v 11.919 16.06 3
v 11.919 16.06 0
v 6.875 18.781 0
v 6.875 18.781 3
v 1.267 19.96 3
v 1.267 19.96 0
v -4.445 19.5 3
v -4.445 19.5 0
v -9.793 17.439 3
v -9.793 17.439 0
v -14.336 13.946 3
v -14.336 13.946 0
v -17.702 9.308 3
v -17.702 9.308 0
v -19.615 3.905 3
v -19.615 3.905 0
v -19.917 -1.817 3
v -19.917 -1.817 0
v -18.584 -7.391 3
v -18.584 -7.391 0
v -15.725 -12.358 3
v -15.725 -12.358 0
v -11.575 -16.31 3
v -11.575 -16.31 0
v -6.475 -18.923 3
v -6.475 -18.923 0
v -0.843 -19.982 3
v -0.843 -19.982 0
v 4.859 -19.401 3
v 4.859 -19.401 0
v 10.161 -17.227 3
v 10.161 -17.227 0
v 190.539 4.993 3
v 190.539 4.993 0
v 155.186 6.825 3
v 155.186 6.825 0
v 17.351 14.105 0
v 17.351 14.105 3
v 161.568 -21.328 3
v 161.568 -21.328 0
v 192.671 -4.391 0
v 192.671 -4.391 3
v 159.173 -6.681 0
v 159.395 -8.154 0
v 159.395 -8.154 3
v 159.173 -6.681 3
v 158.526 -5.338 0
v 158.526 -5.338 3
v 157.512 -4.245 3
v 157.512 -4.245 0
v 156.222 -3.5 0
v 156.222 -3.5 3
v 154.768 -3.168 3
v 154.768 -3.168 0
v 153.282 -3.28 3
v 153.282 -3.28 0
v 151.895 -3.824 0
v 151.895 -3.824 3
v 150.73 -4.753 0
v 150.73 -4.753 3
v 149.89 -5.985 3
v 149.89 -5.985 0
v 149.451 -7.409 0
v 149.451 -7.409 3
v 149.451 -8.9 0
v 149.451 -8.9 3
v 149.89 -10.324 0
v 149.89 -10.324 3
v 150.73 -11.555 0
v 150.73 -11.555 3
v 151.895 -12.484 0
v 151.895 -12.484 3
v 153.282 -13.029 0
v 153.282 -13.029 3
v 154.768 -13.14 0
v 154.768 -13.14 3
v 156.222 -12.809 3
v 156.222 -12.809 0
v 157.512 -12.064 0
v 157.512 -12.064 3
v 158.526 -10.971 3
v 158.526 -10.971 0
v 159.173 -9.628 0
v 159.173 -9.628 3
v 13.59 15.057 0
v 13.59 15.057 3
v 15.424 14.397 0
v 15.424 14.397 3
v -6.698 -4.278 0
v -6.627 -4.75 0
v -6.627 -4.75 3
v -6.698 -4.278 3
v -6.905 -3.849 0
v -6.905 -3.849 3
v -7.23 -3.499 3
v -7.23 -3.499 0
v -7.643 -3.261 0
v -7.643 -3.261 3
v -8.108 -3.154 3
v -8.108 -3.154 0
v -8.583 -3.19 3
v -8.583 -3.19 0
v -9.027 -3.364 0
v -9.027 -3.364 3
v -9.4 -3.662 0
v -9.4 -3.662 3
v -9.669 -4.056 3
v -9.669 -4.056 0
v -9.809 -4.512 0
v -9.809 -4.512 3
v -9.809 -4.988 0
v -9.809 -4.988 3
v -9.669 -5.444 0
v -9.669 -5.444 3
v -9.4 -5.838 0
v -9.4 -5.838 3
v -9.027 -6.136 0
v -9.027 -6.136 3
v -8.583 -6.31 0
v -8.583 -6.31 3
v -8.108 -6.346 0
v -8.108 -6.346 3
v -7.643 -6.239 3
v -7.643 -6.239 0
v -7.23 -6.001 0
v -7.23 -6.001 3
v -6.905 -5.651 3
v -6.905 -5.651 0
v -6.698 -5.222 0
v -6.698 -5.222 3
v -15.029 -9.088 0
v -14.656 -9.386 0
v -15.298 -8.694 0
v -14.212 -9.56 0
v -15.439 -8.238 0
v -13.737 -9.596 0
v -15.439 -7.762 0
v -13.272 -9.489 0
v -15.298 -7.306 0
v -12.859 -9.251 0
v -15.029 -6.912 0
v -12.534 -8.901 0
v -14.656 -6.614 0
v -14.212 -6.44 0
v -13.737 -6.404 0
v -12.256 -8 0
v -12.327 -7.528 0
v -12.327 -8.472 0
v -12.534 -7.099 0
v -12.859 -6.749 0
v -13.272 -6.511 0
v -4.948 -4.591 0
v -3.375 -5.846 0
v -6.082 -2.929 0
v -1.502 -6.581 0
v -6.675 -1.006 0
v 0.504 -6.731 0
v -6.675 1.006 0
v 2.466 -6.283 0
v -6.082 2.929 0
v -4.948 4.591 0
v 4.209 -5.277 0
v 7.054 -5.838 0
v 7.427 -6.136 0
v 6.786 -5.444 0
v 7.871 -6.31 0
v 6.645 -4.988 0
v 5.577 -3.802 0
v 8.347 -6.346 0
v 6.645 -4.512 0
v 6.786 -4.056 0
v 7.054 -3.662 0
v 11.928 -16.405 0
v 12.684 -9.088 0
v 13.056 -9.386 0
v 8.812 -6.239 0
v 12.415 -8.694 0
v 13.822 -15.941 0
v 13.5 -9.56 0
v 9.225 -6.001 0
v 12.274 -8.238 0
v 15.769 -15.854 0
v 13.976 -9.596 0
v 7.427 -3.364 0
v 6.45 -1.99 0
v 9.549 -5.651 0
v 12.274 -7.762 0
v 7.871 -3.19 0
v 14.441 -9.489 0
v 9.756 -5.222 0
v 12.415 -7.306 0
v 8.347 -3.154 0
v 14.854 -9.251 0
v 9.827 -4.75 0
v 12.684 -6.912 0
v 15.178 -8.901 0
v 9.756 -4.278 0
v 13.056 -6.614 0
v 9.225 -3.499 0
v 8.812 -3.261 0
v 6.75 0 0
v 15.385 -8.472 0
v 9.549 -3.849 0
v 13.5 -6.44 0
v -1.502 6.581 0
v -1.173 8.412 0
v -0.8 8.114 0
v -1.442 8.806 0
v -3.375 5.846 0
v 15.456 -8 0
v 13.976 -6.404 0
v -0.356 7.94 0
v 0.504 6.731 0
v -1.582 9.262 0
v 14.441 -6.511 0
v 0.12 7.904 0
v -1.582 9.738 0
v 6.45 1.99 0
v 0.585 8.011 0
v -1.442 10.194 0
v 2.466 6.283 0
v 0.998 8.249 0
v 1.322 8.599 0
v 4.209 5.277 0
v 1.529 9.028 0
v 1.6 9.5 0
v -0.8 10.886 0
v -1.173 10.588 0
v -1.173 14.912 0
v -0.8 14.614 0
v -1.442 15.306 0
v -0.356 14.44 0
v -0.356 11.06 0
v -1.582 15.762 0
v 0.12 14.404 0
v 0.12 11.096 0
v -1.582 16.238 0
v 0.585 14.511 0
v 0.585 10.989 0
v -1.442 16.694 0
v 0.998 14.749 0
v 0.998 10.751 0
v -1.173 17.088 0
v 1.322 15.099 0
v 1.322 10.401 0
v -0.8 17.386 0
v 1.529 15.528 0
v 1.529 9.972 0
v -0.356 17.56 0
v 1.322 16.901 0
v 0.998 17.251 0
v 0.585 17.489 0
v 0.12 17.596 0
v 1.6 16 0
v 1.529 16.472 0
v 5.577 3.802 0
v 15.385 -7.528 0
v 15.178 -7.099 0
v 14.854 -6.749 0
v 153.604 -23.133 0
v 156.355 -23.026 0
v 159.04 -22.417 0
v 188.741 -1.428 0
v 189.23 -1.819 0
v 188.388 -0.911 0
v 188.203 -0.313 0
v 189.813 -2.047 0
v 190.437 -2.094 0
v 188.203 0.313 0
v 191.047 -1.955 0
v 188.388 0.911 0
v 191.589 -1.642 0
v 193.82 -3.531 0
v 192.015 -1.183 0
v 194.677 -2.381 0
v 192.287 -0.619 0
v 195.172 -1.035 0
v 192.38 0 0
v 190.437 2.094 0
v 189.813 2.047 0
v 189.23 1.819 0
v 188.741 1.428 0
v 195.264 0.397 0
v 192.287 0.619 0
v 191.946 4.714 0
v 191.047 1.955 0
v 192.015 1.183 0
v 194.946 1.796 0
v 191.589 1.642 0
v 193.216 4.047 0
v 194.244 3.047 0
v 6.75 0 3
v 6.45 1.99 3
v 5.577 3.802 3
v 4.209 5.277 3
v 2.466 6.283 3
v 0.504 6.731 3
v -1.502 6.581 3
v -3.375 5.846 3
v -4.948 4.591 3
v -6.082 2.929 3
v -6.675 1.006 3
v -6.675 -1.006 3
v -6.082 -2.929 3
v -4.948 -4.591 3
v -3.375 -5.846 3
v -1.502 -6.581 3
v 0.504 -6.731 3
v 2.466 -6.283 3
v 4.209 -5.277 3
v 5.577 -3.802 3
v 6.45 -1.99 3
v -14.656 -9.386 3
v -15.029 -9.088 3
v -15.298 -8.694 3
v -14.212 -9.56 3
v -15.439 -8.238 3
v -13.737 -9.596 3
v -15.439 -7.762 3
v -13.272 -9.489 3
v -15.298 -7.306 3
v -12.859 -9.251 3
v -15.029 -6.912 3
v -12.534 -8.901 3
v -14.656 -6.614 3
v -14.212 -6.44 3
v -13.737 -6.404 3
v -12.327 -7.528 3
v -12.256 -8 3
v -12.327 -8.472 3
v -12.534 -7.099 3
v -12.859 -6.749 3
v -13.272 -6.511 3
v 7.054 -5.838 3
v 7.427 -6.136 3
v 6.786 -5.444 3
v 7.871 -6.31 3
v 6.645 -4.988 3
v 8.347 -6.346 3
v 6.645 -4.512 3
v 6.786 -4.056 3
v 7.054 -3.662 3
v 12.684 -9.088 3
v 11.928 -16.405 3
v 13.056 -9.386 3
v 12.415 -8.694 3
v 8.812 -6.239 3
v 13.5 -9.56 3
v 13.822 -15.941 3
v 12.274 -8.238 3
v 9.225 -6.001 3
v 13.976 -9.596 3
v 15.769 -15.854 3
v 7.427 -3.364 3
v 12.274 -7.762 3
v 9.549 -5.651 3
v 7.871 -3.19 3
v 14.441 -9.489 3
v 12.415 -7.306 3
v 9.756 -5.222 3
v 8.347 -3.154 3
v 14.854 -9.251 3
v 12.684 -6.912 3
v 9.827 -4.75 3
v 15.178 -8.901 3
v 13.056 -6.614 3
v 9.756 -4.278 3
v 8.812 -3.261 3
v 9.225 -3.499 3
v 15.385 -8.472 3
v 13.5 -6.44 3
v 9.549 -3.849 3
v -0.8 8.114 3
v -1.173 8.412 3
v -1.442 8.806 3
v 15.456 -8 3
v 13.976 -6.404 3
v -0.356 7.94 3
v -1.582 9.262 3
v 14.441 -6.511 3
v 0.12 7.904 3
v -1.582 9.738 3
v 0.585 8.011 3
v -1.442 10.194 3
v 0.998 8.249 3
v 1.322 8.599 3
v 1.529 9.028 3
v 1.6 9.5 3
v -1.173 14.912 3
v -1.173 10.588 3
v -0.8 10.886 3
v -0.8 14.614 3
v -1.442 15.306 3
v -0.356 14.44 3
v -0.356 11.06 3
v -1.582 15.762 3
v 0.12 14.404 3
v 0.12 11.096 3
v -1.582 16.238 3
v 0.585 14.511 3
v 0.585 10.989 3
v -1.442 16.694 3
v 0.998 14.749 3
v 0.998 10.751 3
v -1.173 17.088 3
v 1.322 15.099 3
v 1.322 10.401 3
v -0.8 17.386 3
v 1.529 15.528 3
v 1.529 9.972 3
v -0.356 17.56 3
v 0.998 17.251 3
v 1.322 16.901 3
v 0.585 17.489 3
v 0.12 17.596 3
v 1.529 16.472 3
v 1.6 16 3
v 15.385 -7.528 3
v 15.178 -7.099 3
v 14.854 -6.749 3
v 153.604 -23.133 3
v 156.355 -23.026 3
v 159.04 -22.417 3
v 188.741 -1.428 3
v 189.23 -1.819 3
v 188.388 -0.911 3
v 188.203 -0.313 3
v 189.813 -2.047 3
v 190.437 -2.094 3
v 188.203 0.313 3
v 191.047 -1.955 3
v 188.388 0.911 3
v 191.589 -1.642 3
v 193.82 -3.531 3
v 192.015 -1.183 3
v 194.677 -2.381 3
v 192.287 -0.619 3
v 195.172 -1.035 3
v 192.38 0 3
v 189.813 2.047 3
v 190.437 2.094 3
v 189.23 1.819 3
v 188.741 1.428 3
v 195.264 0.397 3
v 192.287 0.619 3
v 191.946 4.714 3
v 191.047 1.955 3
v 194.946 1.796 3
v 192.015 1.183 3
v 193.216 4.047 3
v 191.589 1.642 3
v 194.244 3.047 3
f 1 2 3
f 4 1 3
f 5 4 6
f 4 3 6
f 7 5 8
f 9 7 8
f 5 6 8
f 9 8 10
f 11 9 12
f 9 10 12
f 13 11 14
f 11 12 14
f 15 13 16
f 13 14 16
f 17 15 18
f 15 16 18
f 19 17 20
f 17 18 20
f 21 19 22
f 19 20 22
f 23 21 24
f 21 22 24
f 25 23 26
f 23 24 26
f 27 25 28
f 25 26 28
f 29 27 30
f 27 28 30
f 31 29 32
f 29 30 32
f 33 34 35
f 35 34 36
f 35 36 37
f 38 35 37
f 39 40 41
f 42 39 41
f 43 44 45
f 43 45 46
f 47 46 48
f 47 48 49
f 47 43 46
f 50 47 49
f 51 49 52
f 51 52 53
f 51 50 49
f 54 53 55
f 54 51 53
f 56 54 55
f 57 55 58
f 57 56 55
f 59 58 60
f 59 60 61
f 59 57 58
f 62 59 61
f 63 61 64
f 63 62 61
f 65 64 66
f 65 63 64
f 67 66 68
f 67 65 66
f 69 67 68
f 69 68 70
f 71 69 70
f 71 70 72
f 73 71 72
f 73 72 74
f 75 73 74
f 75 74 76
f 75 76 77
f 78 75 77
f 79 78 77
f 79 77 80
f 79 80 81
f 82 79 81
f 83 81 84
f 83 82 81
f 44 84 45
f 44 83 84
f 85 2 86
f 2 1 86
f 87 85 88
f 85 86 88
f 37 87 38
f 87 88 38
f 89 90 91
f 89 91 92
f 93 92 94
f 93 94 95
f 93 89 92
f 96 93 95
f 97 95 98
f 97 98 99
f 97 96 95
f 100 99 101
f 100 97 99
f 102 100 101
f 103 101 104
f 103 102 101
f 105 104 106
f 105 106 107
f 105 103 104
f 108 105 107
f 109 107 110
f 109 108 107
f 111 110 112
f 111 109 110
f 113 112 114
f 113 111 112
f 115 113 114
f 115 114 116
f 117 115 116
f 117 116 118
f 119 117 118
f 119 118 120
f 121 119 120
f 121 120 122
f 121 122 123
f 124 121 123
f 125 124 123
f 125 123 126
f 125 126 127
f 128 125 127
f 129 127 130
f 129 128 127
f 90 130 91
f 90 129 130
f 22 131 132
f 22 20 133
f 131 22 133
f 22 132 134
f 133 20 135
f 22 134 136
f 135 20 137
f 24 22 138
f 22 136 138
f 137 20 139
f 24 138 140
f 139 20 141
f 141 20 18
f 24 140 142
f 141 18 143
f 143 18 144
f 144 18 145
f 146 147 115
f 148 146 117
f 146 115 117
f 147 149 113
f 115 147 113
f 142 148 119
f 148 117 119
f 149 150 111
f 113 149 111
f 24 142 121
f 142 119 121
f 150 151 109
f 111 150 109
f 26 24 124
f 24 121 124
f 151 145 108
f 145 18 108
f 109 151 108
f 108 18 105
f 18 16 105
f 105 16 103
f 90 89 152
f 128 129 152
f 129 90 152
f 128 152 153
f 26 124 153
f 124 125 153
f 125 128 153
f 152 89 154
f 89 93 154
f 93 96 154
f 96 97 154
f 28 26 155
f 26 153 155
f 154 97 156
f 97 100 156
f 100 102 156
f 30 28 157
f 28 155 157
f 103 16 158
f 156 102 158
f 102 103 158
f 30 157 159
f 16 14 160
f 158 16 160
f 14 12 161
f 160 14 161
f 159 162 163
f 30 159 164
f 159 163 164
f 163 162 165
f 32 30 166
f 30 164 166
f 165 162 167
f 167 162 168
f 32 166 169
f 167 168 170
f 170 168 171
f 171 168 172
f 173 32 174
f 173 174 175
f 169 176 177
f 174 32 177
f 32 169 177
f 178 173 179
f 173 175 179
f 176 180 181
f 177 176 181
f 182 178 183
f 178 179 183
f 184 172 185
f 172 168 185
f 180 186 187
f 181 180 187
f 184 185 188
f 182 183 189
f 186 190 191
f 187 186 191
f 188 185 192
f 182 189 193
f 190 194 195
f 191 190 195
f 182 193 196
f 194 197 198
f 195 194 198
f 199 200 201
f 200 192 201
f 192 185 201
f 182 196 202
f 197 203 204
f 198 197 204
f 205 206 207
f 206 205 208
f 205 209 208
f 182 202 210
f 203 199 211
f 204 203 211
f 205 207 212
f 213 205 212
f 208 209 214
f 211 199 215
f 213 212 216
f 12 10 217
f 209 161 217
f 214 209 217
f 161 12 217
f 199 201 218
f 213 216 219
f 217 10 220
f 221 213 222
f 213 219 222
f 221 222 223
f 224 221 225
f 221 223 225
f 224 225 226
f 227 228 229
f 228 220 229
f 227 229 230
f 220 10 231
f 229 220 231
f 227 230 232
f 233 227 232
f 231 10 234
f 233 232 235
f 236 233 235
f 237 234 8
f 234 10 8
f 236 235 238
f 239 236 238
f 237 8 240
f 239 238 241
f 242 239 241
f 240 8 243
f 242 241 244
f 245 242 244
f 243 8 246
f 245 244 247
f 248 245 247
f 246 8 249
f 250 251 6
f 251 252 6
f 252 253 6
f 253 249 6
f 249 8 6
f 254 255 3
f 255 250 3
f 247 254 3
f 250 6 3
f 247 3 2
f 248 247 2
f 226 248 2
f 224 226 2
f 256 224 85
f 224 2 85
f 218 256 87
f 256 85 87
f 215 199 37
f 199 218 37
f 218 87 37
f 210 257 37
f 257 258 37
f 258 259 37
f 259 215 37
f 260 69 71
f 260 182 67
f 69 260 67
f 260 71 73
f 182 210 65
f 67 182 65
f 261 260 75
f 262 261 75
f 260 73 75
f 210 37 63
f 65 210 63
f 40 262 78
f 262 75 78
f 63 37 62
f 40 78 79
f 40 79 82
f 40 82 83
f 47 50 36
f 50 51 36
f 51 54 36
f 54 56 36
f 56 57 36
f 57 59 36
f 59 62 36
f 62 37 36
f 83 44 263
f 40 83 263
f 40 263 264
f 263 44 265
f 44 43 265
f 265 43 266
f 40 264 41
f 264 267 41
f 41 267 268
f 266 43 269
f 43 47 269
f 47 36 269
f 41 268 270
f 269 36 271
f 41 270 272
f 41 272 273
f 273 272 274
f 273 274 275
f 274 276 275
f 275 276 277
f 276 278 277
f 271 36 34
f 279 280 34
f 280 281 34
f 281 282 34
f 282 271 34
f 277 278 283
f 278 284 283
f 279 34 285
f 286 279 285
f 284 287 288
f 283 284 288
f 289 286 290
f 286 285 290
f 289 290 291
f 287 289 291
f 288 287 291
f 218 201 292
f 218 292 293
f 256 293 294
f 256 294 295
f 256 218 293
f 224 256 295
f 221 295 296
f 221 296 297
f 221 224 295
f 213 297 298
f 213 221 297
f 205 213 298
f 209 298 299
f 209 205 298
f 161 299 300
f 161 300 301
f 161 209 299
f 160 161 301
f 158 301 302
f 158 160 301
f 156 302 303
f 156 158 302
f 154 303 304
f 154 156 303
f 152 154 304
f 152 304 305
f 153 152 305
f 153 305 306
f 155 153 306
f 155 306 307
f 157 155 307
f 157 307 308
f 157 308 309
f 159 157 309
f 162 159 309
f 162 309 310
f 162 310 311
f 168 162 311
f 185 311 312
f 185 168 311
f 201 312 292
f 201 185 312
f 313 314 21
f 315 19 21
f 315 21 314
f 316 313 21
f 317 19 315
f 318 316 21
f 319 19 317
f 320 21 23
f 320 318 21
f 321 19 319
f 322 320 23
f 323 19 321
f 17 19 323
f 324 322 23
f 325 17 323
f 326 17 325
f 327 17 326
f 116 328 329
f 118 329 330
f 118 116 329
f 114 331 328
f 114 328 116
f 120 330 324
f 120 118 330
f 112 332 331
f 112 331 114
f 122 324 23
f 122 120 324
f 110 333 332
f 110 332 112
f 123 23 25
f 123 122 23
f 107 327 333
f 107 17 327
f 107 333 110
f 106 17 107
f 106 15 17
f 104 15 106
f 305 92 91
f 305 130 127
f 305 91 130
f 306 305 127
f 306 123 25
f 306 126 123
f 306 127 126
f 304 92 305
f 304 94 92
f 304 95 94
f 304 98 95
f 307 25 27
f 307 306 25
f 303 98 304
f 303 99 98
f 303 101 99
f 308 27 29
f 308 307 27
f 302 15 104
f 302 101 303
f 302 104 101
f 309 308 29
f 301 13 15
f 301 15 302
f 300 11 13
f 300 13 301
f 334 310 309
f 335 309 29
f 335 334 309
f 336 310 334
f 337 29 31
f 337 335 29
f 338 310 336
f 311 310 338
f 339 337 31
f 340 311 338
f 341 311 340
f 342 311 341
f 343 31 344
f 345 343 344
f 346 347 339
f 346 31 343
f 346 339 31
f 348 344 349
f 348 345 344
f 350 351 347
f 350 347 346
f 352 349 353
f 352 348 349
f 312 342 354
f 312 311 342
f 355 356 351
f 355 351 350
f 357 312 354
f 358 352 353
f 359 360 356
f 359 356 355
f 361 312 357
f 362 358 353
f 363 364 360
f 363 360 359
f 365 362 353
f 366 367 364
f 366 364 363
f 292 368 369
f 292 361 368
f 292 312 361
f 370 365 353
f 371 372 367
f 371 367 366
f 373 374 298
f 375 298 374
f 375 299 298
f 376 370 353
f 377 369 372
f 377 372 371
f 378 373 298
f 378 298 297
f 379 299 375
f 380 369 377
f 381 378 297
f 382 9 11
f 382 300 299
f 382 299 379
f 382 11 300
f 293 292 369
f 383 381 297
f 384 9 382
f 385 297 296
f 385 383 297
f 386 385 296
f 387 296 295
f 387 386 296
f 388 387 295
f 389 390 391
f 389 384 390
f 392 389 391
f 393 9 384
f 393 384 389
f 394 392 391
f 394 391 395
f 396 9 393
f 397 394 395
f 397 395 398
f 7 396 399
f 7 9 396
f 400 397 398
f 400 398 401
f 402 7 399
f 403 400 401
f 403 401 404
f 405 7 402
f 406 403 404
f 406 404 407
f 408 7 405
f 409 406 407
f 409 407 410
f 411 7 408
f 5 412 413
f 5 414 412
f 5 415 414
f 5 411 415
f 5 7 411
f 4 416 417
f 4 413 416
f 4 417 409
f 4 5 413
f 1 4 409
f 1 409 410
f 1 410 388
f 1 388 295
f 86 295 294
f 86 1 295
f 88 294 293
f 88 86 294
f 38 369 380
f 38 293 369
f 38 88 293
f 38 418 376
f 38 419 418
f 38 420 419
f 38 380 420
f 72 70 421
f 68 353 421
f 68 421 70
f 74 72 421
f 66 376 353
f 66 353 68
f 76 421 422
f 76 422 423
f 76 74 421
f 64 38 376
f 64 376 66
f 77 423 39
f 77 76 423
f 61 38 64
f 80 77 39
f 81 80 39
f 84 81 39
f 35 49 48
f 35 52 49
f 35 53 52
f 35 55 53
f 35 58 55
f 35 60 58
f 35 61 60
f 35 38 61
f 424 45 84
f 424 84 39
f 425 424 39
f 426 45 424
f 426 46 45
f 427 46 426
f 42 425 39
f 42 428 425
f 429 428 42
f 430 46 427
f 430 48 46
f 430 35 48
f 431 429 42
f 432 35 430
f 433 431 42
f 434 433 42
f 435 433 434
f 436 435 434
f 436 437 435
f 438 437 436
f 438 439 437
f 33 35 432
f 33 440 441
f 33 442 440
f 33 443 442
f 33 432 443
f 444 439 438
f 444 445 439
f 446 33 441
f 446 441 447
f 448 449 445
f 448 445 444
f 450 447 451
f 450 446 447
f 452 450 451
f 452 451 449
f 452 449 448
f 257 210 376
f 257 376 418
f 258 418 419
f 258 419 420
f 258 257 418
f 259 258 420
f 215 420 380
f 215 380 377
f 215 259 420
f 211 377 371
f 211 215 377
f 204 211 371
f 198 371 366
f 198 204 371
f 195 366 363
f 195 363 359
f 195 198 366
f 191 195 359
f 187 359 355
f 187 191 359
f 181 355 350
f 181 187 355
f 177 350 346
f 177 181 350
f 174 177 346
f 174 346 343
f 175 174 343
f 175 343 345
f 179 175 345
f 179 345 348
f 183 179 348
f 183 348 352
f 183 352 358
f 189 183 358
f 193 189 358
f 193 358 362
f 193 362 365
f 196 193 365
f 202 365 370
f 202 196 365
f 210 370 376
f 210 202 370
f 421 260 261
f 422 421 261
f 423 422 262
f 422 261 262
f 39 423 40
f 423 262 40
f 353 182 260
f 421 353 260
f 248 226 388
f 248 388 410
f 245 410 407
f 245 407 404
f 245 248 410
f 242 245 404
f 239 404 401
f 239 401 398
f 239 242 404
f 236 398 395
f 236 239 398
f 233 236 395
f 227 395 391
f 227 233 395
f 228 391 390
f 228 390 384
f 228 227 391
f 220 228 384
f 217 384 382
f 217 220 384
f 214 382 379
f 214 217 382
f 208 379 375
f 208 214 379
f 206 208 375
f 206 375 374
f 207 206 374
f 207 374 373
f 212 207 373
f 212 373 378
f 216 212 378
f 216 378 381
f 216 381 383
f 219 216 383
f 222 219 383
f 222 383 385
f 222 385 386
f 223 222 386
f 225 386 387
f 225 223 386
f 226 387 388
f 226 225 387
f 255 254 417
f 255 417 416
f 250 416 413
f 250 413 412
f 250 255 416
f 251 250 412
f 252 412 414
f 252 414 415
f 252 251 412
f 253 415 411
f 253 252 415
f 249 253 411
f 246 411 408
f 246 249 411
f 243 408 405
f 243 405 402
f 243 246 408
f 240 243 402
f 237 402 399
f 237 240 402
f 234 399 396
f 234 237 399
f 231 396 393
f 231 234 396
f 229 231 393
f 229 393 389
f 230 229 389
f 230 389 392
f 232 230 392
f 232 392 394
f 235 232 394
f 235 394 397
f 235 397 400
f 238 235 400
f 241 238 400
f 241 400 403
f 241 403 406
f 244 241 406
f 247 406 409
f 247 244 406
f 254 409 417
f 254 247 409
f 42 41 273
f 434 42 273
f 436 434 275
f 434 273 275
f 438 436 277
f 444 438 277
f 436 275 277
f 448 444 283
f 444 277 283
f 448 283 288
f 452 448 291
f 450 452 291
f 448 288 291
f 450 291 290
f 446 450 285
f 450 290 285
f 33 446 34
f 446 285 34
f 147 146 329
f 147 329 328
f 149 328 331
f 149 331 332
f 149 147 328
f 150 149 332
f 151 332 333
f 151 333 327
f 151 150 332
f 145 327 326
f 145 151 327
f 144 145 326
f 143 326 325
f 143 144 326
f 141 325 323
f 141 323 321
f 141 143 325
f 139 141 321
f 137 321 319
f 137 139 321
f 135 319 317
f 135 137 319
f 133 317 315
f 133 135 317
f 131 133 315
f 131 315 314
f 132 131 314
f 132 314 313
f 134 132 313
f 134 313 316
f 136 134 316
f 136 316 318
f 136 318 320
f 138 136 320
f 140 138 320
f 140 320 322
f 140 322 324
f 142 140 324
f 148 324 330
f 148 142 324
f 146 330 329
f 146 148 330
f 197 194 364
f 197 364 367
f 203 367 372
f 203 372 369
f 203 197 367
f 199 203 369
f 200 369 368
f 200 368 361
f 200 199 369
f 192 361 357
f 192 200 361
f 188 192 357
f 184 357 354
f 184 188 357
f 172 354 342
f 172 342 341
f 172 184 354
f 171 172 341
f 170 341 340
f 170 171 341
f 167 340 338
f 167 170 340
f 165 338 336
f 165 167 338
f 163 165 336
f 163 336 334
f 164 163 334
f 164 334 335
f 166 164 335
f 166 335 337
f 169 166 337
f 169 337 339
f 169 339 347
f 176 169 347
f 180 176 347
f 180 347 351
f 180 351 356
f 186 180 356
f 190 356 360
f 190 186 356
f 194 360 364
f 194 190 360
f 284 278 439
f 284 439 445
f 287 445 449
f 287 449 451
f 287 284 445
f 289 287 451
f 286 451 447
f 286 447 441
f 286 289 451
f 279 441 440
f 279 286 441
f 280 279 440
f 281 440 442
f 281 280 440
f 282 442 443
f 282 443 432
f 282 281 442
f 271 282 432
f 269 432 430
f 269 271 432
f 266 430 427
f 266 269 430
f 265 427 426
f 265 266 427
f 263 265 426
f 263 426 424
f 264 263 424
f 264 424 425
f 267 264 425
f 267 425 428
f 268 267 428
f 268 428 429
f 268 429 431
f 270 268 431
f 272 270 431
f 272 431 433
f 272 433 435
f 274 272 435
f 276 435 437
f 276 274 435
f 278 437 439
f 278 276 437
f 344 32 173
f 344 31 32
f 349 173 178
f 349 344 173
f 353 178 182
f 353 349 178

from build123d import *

# Parameters (mm, degrees)
SKETCH_1_R      = 5
SKETCH_1_R_2    = 2.1
SKETCH_1_R_3    = 6.75
SKETCH_1_R_4    = 1.6
EXTRUDE_1_DEPTH = 3
FILLET_1_R      = 10
FILLET_2_R      = 10


with BuildPart() as part:
    # 草图1 → 凸台-拉伸1 (new body)
    with BuildSketch(Plane.XY):
        with BuildLine():
            Line((12.419223494, -15.676826458), (153.603692908, -23.133474126))
            ThreePointArc((153.603692908, -23.133474126), (157.711237696, -22.783135564), (161.568286957, -21.32785817))
            Line((161.568286957, -21.32785817), (192.671157578, -4.391169028))
            ThreePointArc((192.671157578, -4.391169028), (195.155704471, 1.10792866), (190.538680801, 4.993303941))
            Line((190.538680801, 4.993303941), (155.185935535, 6.824771956))
            Line((155.185935535, 6.824771956), (14.001466121, 14.281419623))
            ThreePointArc((14.001466121, 14.281419623), (-19.972164054, 1.054828418), (12.419223494, -15.676826458))
        make_face()
        with Locations((154.394814221, -8.154351085)):
            Circle(SKETCH_1_R, mode=Mode.SUBTRACT)
        with Locations((190.28, 0)):
            Circle(SKETCH_1_R_2, mode=Mode.SUBTRACT)
        Circle(SKETCH_1_R_3, mode=Mode.SUBTRACT)
        with Locations((0, 9.5)):
            Circle(SKETCH_1_R_4, mode=Mode.SUBTRACT)
        with Locations((0, 16)):
            Circle(SKETCH_1_R_4, mode=Mode.SUBTRACT)
        with Locations((8.227241336, -4.75)):
            Circle(SKETCH_1_R_4, mode=Mode.SUBTRACT)
        with Locations((-8.227241336, -4.75)):
            Circle(SKETCH_1_R_4, mode=Mode.SUBTRACT)
        with Locations((13.856406461, -8)):
            Circle(SKETCH_1_R_4, mode=Mode.SUBTRACT)
        with Locations((-13.856406461, -8)):
            Circle(SKETCH_1_R_4, mode=Mode.SUBTRACT)
    extrude(amount=EXTRUDE_1_DEPTH)

    # 圆角1
    fillet_1_edges = [part.edges().sort_by_distance(p)[0] for p in [
        (14.001466121, 14.281419623, 1.5),
    ]]
    fillet(fillet_1_edges, radius=FILLET_1_R)

    # 圆角2
    fillet_2_edges = [part.edges().sort_by_distance(p)[0] for p in [
        (12.419223494, -15.676826458, 1.5),
    ]]
    fillet(fillet_2_edges, radius=FILLET_2_R)


solid = part.part
